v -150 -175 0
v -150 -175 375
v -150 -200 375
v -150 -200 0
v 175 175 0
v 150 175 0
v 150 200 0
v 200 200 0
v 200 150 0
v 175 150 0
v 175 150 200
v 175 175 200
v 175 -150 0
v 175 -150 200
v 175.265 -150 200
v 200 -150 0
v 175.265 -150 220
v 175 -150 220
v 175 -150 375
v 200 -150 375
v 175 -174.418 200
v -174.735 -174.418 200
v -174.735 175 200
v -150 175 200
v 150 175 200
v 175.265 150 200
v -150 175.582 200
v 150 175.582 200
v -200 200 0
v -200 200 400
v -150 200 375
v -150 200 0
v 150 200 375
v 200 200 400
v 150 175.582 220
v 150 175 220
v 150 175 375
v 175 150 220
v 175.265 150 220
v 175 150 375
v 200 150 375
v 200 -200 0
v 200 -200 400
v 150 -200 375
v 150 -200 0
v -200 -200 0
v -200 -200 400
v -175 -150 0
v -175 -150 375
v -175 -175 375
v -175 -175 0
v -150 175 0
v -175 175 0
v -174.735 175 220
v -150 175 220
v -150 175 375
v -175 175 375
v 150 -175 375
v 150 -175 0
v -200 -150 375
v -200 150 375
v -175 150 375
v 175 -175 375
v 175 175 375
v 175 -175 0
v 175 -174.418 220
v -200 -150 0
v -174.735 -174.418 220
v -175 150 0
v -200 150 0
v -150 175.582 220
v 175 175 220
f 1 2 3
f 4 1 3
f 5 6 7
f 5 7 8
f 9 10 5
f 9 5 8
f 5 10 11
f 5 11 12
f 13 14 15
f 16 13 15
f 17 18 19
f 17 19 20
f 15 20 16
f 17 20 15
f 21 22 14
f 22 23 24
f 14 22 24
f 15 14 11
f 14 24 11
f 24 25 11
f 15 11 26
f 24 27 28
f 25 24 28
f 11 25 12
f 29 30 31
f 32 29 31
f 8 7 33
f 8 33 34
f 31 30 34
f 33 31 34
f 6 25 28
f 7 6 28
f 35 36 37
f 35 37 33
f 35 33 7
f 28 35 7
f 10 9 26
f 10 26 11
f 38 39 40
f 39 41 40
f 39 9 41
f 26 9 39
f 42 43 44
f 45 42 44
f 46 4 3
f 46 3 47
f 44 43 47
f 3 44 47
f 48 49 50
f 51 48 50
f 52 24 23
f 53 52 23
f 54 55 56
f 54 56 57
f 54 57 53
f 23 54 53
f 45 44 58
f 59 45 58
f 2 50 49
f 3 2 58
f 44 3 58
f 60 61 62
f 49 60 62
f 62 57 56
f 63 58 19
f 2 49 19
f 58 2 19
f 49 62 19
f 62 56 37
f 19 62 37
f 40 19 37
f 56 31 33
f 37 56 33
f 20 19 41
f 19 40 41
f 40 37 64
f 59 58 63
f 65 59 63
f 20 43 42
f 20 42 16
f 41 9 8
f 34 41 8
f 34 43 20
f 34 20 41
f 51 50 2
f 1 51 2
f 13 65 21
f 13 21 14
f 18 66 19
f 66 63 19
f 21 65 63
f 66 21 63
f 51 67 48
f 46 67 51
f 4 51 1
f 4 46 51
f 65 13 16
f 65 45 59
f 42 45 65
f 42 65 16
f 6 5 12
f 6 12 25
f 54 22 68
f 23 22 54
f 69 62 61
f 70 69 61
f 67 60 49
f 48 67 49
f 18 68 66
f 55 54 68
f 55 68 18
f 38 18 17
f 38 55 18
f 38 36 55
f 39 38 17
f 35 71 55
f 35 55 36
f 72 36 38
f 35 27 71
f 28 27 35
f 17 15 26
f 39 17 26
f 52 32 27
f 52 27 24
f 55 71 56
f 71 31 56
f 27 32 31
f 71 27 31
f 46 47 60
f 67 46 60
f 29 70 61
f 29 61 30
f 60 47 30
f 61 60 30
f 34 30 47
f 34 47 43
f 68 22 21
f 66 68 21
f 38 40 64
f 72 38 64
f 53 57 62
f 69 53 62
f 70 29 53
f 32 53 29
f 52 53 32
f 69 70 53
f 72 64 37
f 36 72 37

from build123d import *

# Parameters (mm, degrees)
F1_W     = 400
F1_H     = 400
F2_DEPTH = 25
F4_DEPTH = 375
F6_W     = 350
F6_H     = 350
F7_DEPTH = 20


with BuildPart() as f2:
    # F1 (on offset) → F2 (new body)
    with BuildSketch(Plane.XY.offset(400)):
        Rectangle(F1_W, F1_H)
    extrude(amount=-F2_DEPTH)

    # F3 (on face) → F4 (join)
    with BuildSketch(Plane(origin=(0, 0, 375), x_dir=(1, 0, 0), z_dir=(0, 0, -1))):
        Polygon((-200, 200), (-200, 150), (-175, 150), (-175, 175), (-150, 175), (-150, 200), align=None)
        Polygon((175, 150), (200, 150), (200, 200), (150, 200), (150, 175), (175, 175), align=None)
        Polygon((-150, -175), (-175, -175), (-175, -150), (-200, -150), (-200, -200), (-150, -200), align=None)
        Polygon((200, -200), (200, -150), (175, -150), (175, -175), (150, -175), (150, -200), align=None)
    extrude(amount=F4_DEPTH)

    # F6 (on offset) → F7 (join)
    with BuildSketch(Plane.XY.offset(200)):
        with Locations((0.264752, 0.58246)):
            Rectangle(F6_W, F6_H)
    extrude(amount=F7_DEPTH)


solid = f2.part
